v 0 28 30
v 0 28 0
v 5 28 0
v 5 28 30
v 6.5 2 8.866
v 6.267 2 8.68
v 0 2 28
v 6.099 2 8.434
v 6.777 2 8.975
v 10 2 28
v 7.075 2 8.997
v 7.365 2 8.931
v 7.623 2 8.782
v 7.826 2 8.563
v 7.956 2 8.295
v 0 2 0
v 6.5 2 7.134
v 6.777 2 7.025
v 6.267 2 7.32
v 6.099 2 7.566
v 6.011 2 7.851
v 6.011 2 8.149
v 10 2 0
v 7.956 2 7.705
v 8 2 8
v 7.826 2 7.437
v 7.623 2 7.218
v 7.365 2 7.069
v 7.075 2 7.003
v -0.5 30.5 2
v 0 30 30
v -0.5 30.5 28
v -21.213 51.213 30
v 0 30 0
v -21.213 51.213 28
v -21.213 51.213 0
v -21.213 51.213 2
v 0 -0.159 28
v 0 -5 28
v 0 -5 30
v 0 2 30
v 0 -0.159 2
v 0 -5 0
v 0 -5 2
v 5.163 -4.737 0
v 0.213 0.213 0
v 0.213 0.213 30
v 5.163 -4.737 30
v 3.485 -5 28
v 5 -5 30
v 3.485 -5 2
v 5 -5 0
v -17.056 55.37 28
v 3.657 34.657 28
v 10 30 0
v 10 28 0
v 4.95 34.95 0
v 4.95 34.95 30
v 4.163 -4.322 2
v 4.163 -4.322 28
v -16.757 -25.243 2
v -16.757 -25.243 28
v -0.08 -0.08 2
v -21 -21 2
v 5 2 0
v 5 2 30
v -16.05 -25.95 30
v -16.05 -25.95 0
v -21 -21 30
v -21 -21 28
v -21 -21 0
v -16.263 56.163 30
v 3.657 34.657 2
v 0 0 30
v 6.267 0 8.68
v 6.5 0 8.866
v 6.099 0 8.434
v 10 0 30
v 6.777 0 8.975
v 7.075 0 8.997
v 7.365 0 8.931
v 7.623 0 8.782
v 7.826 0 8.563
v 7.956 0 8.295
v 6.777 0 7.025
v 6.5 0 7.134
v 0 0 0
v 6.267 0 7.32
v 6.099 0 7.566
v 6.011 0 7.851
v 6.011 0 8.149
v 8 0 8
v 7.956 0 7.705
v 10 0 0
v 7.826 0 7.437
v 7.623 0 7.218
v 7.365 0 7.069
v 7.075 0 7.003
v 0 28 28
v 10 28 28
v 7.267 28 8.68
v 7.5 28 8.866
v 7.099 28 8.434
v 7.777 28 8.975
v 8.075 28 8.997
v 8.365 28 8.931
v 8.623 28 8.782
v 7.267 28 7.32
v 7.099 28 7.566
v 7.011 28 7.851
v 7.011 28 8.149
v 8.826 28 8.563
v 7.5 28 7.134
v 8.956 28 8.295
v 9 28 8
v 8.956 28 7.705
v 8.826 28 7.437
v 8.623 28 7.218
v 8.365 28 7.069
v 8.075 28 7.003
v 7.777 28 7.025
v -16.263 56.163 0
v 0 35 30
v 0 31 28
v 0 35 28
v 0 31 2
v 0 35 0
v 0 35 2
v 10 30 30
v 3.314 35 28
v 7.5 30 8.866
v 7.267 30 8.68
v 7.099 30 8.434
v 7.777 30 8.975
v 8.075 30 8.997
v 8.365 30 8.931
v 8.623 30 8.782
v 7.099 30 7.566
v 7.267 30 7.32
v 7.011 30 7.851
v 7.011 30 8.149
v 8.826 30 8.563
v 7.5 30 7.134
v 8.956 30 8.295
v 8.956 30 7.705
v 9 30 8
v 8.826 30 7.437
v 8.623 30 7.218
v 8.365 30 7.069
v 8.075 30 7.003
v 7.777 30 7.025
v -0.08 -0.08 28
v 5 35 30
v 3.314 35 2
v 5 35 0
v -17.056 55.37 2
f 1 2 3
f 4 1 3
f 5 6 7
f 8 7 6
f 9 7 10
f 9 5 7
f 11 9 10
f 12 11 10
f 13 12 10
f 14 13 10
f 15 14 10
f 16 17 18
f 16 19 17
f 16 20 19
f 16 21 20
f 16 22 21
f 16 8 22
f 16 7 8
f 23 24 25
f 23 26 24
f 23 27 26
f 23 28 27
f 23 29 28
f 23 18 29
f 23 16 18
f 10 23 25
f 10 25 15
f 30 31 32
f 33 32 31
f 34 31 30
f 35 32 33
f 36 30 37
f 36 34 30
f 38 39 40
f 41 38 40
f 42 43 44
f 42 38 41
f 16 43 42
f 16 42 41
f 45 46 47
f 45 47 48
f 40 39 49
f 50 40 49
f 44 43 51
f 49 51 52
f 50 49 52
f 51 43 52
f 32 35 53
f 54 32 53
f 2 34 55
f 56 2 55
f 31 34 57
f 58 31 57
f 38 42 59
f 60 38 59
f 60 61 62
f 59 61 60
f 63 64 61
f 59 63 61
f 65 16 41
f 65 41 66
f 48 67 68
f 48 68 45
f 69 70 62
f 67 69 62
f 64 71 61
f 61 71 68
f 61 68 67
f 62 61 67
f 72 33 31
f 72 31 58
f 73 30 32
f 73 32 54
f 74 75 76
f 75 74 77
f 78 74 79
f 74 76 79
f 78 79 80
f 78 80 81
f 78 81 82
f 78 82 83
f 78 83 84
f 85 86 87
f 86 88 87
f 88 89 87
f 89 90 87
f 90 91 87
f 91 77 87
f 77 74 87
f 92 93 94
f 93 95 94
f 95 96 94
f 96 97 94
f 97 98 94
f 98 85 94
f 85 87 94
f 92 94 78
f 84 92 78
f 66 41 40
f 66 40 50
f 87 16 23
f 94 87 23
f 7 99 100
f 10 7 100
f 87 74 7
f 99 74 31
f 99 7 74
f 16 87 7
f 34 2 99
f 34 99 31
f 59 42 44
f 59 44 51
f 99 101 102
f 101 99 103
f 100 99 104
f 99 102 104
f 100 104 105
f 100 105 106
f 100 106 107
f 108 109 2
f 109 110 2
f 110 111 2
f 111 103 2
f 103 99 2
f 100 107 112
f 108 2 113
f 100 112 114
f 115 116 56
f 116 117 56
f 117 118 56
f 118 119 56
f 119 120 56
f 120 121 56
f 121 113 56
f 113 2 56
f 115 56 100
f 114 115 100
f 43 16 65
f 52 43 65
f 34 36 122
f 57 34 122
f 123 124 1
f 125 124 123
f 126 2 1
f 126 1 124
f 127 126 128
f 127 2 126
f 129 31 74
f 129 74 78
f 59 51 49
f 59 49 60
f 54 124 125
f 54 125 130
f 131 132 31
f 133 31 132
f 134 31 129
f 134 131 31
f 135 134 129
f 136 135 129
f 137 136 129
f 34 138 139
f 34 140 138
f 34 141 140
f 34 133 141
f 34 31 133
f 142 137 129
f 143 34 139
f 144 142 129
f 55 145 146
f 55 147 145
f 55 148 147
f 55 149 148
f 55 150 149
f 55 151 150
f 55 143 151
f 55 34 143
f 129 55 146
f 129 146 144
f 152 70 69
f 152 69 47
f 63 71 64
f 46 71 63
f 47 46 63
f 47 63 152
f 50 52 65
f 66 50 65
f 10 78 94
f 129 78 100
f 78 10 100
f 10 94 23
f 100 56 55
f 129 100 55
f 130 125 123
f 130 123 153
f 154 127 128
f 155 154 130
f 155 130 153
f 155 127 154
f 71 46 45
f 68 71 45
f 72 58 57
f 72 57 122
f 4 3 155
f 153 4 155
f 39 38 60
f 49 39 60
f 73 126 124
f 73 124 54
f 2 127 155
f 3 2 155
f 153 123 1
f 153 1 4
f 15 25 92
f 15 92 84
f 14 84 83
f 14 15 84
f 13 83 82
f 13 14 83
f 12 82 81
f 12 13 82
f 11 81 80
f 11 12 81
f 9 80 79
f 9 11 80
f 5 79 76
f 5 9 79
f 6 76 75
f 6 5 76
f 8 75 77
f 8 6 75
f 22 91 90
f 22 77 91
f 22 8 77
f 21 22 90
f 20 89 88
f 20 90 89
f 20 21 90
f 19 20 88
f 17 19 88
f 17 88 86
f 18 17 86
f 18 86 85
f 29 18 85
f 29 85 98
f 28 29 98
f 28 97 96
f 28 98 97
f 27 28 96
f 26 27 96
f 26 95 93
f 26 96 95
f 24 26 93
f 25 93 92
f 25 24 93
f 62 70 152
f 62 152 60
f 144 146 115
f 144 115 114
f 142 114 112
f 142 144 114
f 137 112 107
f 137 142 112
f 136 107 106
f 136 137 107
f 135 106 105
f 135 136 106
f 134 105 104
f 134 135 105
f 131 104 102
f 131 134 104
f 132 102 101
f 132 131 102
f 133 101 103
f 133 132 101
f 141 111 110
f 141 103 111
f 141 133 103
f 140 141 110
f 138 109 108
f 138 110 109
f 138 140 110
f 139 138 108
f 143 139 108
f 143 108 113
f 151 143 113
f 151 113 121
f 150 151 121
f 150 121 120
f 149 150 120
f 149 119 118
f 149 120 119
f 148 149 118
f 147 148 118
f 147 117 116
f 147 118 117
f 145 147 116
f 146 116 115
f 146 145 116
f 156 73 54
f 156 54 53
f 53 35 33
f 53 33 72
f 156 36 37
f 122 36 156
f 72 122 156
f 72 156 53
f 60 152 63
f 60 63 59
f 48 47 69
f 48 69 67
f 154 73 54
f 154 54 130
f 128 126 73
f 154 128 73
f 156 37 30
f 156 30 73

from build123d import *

# Parameters (mm, degrees)
CYLINDER_R             = 1
CYLINDER_DEPTH         = 10
CYLINDER_ROLL_ANGLE    = 90
CYLINDER001_R          = 1
CYLINDER001_DEPTH      = 10
CYLINDER001_ROLL_ANGLE = 90
BOX001_W               = 45
BOX001_H               = 26
BOX001_DEPTH           = 29
BOX_W                  = 10
BOX_H                  = 30
BOX_DEPTH              = 30
BOX005_W               = 6
BOX005_H               = 31
BOX005_DEPTH           = 26
BOX005_PLACEMENT_ANGLE = -45
BOX003_W               = 7
BOX003_H               = 30
BOX003_DEPTH           = 30
BOX003_PLACEMENT_ANGLE = -45
BOX004_W               = 8
BOX004_H               = 34
BOX004_DEPTH           = 26
BOX004_PLACEMENT_ANGLE = 45
BOX002_W               = 7
BOX002_H               = 30
BOX002_DEPTH           = 30
BOX002_PLACEMENT_ANGLE = 45
BOX007_W               = 5
BOX007_H               = 7
BOX007_DEPTH           = 30
BOX006_W               = 5
BOX006_H               = 7
BOX006_DEPTH           = 30


with BuildPart() as cylinder:
    # Cylinder → Cylinder (new body)
    with BuildSketch(Plane.XY):
        Circle(CYLINDER_R)
    extrude(amount=CYLINDER_DEPTH)


with BuildPart() as cylinder_1:
    # Cylinder roll: moved
    add(cylinder.part.rotate(Axis((0, 0, 0), (1, 0, 0)), CYLINDER_ROLL_ANGLE))


with BuildPart() as cylinder_2:
    # Cylinder placement: moved
    add(cylinder_1.part.moved(Location((8, 35, 8))))


with BuildPart() as cylinder001:
    # Cylinder001 → Cylinder001 (new body)
    with BuildSketch(Plane.XY):
        Circle(CYLINDER001_R)
    extrude(amount=CYLINDER001_DEPTH)


with BuildPart() as cylinder001_1:
    # Cylinder001 roll: moved
    add(cylinder001.part.rotate(Axis((0, 0, 0), (1, 0, 0)), CYLINDER001_ROLL_ANGLE))


with BuildPart() as cylinder001_2:
    # Cylinder001 placement: moved
    add(cylinder001_1.part.moved(Location((7, 6, 8))))


with BuildPart() as cube001:
    # Box001 → Box001 (new body)
    with BuildSketch(Plane(origin=(-6, 2, -1), x_dir=(1, 0, 0), z_dir=(0, 0, 1))):
        with Locations((22.5, 13)):
            Rectangle(BOX001_W, BOX001_H)
    extrude(amount=BOX001_DEPTH)


with BuildPart() as cut002:
    # Box → Box (new body)
    with BuildSketch(Plane.XY):
        with Locations((5, 15)):
            Rectangle(BOX_W, BOX_H)
    extrude(amount=BOX_DEPTH)

    # Cut: cut Cube001
    add(cube001.part, mode=Mode.SUBTRACT)

    # Cut001: cut Cylinder001
    add(cylinder001_2.part, mode=Mode.SUBTRACT)

    # Cut002: cut Cylinder
    add(cylinder_2.part, mode=Mode.SUBTRACT)


with BuildPart() as cube005:
    # Box005 → Box005 (new body)
    with BuildSketch(Plane.XY):
        with Locations((3, 15.5)):
            Rectangle(BOX005_W, BOX005_H)
    extrude(amount=BOX005_DEPTH)


with BuildPart() as cube005_1:
    # Box005 placement: moved
    add(cube005.part.moved(Location((-22, -22, 2))).rotate(Axis((-22, -22, 2), (0, 0, 1)), BOX005_PLACEMENT_ANGLE))


with BuildPart() as cut003:
    # Box003 → Box003 (new body)
    with BuildSketch(Plane.XY):
        with Locations((3.5, 15)):
            Rectangle(BOX003_W, BOX003_H)
    extrude(amount=BOX003_DEPTH)


with BuildPart() as cut003_1:
    # Box003 placement: moved
    add(cut003.part.moved(Location((-21, -21, 0))).rotate(Axis((-21, -21, 0), (0, 0, 1)), BOX003_PLACEMENT_ANGLE))

    # Cut003: cut Cube005
    add(cube005_1.part, mode=Mode.SUBTRACT)


with BuildPart() as cube004:
    # Box004 → Box004 (new body)
    with BuildSketch(Plane.XY):
        with Locations((4, 17)):
            Rectangle(BOX004_W, BOX004_H)
    extrude(amount=BOX004_DEPTH)


with BuildPart() as cube004_1:
    # Box004 placement: moved
    add(cube004.part.moved(Location((-2, 29, 2))).rotate(Axis((-2, 29, 2), (0, 0, 1)), BOX004_PLACEMENT_ANGLE))


with BuildPart() as cut004:
    # Box002 → Box002 (new body)
    with BuildSketch(Plane.XY):
        with Locations((3.5, 15)):
            Rectangle(BOX002_W, BOX002_H)
    extrude(amount=BOX002_DEPTH)


with BuildPart() as cut004_1:
    # Box002 placement: moved
    add(cut004.part.moved(Location((0, 30, 0))).rotate(Axis((0, 30, 0), (0, 0, 1)), BOX002_PLACEMENT_ANGLE))

    # Cut004: cut Cube004
    add(cube004_1.part, mode=Mode.SUBTRACT)


with BuildPart() as cut005:
    # Box007 → Box007 (new body)
    with BuildSketch(Plane(origin=(0, 28, 0), x_dir=(1, 0, 0), z_dir=(0, 0, 1))):
        with Locations((2.5, 3.5)):
            Rectangle(BOX007_W, BOX007_H)
    extrude(amount=BOX007_DEPTH)

    # Cut005: cut Cube004
    add(cube004_1.part, mode=Mode.SUBTRACT)


with BuildPart() as cut006:
    # Box006 → Box006 (new body)
    with BuildSketch(Plane(origin=(0, -5, 0), x_dir=(1, 0, 0), z_dir=(0, 0, 1))):
        with Locations((2.5, 3.5)):
            Rectangle(BOX006_W, BOX006_H)
    extrude(amount=BOX006_DEPTH)

    # Cut006: cut Cube005
    add(cube005_1.part, mode=Mode.SUBTRACT)


solid = Compound([cut002.part, cut003_1.part, cut004_1.part, cut005.part, cut006.part])
